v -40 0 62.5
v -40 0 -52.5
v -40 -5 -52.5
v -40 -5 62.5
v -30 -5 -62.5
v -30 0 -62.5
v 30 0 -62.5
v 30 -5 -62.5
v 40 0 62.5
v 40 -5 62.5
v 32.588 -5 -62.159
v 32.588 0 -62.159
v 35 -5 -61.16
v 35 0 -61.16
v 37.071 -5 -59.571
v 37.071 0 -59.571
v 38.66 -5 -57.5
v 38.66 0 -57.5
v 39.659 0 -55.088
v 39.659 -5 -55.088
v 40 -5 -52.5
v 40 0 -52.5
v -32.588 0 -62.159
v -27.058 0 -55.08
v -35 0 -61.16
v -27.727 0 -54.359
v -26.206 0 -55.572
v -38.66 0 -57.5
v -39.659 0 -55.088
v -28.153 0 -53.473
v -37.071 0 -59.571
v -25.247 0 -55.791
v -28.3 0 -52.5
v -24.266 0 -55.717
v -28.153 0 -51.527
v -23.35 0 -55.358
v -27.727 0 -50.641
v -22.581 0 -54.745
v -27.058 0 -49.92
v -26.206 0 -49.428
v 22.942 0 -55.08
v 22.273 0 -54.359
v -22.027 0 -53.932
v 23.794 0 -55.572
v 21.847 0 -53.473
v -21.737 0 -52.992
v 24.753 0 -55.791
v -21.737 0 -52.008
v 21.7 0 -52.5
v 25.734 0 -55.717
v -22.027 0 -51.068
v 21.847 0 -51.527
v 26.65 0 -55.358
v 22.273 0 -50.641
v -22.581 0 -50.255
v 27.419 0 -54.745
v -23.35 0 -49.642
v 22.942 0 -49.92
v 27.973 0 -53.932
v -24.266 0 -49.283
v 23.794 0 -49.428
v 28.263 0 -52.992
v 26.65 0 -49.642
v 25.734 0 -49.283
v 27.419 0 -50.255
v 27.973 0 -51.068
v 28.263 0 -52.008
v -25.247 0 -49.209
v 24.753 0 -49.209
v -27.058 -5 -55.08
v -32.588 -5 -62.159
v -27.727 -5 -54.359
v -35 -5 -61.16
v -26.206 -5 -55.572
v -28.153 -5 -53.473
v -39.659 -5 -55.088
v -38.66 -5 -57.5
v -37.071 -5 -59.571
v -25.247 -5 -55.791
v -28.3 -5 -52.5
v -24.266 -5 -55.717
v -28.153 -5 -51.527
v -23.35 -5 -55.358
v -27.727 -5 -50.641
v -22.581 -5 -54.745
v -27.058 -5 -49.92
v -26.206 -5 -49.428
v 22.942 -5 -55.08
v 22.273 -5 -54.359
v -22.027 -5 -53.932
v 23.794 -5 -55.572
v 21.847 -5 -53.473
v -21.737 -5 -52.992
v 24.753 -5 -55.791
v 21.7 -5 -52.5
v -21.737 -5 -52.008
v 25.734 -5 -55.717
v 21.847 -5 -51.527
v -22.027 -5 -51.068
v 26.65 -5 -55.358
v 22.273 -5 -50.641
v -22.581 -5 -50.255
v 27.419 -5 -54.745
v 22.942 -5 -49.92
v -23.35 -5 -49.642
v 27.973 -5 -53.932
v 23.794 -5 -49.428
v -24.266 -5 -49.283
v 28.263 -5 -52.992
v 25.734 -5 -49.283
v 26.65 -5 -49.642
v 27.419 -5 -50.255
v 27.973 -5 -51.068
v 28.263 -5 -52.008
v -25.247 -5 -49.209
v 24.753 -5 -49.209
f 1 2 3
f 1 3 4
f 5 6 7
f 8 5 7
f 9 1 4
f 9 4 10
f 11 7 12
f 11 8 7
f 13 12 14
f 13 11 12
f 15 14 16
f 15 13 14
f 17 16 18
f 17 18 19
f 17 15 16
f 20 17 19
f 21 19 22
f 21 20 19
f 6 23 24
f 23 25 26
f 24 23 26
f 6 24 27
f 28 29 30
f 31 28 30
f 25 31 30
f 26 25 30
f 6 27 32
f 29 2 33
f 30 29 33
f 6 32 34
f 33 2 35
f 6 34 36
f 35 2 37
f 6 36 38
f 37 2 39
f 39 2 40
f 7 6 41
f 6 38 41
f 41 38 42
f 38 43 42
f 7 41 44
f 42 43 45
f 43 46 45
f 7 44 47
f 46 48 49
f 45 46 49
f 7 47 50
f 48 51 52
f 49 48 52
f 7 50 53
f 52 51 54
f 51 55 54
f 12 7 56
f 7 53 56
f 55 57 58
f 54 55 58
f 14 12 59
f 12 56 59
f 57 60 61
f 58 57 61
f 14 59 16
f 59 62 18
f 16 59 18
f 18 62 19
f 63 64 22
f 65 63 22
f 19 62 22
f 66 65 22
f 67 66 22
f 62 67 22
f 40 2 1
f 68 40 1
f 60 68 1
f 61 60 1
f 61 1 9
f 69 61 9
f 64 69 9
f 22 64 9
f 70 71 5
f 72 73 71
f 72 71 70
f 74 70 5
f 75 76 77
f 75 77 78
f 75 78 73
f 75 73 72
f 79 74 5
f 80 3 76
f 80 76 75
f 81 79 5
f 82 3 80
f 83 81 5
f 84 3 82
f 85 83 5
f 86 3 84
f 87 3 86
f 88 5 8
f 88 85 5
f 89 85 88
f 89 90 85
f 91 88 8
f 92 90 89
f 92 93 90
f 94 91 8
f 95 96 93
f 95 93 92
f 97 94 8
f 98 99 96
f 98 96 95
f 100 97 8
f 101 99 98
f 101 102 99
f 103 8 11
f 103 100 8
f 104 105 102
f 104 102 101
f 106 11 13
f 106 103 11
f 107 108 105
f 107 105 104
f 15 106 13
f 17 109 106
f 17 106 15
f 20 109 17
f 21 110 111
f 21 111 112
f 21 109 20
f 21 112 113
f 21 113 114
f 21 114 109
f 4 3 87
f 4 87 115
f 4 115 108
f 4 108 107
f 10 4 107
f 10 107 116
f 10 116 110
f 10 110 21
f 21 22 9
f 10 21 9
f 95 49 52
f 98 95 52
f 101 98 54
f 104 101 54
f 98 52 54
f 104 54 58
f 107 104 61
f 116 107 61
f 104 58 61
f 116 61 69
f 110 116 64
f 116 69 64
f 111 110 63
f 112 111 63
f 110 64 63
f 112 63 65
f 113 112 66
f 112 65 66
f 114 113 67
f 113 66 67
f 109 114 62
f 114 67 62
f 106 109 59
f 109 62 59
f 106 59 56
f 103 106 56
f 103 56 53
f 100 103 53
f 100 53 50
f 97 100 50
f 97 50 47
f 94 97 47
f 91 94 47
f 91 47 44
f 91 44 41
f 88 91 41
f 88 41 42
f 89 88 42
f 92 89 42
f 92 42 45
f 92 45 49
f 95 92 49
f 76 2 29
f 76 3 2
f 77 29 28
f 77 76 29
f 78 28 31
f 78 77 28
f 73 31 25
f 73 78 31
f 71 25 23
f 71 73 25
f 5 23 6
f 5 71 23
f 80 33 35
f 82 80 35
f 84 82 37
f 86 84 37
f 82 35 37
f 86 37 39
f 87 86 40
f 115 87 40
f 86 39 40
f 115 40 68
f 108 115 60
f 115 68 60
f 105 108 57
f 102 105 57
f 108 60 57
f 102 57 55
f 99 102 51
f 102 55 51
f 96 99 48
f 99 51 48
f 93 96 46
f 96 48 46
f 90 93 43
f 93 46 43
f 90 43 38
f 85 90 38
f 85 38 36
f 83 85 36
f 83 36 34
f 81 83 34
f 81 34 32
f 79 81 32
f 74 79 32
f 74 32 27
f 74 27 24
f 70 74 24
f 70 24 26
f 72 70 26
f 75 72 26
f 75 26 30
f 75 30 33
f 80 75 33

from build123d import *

# Parameters (mm, degrees)
F0_W     = 80
F0_H     = 125
F1_DEPTH = 5
F3_D     = 6.6
F4_R     = 10


with BuildPart() as f1:
    # F0 (on Front) → F1 (new body)
    with BuildSketch(Plane.XZ):
        Rectangle(F0_W, F0_H)
    extrude(amount=F1_DEPTH)

    # F3 (through all)
    with Locations(Plane.XZ.offset(5)):
        with Locations((-25, -52.5), (25, -52.5)):
            Hole(F3_D / 2)

    # F4
    f4_edges = [f1.edges().sort_by_distance(p)[0] for p in [
        (40, -2.5, -62.5),
        (-40, -2.5, -62.5),
    ]]
    fillet(f4_edges, radius=F4_R)


solid = f1.part
